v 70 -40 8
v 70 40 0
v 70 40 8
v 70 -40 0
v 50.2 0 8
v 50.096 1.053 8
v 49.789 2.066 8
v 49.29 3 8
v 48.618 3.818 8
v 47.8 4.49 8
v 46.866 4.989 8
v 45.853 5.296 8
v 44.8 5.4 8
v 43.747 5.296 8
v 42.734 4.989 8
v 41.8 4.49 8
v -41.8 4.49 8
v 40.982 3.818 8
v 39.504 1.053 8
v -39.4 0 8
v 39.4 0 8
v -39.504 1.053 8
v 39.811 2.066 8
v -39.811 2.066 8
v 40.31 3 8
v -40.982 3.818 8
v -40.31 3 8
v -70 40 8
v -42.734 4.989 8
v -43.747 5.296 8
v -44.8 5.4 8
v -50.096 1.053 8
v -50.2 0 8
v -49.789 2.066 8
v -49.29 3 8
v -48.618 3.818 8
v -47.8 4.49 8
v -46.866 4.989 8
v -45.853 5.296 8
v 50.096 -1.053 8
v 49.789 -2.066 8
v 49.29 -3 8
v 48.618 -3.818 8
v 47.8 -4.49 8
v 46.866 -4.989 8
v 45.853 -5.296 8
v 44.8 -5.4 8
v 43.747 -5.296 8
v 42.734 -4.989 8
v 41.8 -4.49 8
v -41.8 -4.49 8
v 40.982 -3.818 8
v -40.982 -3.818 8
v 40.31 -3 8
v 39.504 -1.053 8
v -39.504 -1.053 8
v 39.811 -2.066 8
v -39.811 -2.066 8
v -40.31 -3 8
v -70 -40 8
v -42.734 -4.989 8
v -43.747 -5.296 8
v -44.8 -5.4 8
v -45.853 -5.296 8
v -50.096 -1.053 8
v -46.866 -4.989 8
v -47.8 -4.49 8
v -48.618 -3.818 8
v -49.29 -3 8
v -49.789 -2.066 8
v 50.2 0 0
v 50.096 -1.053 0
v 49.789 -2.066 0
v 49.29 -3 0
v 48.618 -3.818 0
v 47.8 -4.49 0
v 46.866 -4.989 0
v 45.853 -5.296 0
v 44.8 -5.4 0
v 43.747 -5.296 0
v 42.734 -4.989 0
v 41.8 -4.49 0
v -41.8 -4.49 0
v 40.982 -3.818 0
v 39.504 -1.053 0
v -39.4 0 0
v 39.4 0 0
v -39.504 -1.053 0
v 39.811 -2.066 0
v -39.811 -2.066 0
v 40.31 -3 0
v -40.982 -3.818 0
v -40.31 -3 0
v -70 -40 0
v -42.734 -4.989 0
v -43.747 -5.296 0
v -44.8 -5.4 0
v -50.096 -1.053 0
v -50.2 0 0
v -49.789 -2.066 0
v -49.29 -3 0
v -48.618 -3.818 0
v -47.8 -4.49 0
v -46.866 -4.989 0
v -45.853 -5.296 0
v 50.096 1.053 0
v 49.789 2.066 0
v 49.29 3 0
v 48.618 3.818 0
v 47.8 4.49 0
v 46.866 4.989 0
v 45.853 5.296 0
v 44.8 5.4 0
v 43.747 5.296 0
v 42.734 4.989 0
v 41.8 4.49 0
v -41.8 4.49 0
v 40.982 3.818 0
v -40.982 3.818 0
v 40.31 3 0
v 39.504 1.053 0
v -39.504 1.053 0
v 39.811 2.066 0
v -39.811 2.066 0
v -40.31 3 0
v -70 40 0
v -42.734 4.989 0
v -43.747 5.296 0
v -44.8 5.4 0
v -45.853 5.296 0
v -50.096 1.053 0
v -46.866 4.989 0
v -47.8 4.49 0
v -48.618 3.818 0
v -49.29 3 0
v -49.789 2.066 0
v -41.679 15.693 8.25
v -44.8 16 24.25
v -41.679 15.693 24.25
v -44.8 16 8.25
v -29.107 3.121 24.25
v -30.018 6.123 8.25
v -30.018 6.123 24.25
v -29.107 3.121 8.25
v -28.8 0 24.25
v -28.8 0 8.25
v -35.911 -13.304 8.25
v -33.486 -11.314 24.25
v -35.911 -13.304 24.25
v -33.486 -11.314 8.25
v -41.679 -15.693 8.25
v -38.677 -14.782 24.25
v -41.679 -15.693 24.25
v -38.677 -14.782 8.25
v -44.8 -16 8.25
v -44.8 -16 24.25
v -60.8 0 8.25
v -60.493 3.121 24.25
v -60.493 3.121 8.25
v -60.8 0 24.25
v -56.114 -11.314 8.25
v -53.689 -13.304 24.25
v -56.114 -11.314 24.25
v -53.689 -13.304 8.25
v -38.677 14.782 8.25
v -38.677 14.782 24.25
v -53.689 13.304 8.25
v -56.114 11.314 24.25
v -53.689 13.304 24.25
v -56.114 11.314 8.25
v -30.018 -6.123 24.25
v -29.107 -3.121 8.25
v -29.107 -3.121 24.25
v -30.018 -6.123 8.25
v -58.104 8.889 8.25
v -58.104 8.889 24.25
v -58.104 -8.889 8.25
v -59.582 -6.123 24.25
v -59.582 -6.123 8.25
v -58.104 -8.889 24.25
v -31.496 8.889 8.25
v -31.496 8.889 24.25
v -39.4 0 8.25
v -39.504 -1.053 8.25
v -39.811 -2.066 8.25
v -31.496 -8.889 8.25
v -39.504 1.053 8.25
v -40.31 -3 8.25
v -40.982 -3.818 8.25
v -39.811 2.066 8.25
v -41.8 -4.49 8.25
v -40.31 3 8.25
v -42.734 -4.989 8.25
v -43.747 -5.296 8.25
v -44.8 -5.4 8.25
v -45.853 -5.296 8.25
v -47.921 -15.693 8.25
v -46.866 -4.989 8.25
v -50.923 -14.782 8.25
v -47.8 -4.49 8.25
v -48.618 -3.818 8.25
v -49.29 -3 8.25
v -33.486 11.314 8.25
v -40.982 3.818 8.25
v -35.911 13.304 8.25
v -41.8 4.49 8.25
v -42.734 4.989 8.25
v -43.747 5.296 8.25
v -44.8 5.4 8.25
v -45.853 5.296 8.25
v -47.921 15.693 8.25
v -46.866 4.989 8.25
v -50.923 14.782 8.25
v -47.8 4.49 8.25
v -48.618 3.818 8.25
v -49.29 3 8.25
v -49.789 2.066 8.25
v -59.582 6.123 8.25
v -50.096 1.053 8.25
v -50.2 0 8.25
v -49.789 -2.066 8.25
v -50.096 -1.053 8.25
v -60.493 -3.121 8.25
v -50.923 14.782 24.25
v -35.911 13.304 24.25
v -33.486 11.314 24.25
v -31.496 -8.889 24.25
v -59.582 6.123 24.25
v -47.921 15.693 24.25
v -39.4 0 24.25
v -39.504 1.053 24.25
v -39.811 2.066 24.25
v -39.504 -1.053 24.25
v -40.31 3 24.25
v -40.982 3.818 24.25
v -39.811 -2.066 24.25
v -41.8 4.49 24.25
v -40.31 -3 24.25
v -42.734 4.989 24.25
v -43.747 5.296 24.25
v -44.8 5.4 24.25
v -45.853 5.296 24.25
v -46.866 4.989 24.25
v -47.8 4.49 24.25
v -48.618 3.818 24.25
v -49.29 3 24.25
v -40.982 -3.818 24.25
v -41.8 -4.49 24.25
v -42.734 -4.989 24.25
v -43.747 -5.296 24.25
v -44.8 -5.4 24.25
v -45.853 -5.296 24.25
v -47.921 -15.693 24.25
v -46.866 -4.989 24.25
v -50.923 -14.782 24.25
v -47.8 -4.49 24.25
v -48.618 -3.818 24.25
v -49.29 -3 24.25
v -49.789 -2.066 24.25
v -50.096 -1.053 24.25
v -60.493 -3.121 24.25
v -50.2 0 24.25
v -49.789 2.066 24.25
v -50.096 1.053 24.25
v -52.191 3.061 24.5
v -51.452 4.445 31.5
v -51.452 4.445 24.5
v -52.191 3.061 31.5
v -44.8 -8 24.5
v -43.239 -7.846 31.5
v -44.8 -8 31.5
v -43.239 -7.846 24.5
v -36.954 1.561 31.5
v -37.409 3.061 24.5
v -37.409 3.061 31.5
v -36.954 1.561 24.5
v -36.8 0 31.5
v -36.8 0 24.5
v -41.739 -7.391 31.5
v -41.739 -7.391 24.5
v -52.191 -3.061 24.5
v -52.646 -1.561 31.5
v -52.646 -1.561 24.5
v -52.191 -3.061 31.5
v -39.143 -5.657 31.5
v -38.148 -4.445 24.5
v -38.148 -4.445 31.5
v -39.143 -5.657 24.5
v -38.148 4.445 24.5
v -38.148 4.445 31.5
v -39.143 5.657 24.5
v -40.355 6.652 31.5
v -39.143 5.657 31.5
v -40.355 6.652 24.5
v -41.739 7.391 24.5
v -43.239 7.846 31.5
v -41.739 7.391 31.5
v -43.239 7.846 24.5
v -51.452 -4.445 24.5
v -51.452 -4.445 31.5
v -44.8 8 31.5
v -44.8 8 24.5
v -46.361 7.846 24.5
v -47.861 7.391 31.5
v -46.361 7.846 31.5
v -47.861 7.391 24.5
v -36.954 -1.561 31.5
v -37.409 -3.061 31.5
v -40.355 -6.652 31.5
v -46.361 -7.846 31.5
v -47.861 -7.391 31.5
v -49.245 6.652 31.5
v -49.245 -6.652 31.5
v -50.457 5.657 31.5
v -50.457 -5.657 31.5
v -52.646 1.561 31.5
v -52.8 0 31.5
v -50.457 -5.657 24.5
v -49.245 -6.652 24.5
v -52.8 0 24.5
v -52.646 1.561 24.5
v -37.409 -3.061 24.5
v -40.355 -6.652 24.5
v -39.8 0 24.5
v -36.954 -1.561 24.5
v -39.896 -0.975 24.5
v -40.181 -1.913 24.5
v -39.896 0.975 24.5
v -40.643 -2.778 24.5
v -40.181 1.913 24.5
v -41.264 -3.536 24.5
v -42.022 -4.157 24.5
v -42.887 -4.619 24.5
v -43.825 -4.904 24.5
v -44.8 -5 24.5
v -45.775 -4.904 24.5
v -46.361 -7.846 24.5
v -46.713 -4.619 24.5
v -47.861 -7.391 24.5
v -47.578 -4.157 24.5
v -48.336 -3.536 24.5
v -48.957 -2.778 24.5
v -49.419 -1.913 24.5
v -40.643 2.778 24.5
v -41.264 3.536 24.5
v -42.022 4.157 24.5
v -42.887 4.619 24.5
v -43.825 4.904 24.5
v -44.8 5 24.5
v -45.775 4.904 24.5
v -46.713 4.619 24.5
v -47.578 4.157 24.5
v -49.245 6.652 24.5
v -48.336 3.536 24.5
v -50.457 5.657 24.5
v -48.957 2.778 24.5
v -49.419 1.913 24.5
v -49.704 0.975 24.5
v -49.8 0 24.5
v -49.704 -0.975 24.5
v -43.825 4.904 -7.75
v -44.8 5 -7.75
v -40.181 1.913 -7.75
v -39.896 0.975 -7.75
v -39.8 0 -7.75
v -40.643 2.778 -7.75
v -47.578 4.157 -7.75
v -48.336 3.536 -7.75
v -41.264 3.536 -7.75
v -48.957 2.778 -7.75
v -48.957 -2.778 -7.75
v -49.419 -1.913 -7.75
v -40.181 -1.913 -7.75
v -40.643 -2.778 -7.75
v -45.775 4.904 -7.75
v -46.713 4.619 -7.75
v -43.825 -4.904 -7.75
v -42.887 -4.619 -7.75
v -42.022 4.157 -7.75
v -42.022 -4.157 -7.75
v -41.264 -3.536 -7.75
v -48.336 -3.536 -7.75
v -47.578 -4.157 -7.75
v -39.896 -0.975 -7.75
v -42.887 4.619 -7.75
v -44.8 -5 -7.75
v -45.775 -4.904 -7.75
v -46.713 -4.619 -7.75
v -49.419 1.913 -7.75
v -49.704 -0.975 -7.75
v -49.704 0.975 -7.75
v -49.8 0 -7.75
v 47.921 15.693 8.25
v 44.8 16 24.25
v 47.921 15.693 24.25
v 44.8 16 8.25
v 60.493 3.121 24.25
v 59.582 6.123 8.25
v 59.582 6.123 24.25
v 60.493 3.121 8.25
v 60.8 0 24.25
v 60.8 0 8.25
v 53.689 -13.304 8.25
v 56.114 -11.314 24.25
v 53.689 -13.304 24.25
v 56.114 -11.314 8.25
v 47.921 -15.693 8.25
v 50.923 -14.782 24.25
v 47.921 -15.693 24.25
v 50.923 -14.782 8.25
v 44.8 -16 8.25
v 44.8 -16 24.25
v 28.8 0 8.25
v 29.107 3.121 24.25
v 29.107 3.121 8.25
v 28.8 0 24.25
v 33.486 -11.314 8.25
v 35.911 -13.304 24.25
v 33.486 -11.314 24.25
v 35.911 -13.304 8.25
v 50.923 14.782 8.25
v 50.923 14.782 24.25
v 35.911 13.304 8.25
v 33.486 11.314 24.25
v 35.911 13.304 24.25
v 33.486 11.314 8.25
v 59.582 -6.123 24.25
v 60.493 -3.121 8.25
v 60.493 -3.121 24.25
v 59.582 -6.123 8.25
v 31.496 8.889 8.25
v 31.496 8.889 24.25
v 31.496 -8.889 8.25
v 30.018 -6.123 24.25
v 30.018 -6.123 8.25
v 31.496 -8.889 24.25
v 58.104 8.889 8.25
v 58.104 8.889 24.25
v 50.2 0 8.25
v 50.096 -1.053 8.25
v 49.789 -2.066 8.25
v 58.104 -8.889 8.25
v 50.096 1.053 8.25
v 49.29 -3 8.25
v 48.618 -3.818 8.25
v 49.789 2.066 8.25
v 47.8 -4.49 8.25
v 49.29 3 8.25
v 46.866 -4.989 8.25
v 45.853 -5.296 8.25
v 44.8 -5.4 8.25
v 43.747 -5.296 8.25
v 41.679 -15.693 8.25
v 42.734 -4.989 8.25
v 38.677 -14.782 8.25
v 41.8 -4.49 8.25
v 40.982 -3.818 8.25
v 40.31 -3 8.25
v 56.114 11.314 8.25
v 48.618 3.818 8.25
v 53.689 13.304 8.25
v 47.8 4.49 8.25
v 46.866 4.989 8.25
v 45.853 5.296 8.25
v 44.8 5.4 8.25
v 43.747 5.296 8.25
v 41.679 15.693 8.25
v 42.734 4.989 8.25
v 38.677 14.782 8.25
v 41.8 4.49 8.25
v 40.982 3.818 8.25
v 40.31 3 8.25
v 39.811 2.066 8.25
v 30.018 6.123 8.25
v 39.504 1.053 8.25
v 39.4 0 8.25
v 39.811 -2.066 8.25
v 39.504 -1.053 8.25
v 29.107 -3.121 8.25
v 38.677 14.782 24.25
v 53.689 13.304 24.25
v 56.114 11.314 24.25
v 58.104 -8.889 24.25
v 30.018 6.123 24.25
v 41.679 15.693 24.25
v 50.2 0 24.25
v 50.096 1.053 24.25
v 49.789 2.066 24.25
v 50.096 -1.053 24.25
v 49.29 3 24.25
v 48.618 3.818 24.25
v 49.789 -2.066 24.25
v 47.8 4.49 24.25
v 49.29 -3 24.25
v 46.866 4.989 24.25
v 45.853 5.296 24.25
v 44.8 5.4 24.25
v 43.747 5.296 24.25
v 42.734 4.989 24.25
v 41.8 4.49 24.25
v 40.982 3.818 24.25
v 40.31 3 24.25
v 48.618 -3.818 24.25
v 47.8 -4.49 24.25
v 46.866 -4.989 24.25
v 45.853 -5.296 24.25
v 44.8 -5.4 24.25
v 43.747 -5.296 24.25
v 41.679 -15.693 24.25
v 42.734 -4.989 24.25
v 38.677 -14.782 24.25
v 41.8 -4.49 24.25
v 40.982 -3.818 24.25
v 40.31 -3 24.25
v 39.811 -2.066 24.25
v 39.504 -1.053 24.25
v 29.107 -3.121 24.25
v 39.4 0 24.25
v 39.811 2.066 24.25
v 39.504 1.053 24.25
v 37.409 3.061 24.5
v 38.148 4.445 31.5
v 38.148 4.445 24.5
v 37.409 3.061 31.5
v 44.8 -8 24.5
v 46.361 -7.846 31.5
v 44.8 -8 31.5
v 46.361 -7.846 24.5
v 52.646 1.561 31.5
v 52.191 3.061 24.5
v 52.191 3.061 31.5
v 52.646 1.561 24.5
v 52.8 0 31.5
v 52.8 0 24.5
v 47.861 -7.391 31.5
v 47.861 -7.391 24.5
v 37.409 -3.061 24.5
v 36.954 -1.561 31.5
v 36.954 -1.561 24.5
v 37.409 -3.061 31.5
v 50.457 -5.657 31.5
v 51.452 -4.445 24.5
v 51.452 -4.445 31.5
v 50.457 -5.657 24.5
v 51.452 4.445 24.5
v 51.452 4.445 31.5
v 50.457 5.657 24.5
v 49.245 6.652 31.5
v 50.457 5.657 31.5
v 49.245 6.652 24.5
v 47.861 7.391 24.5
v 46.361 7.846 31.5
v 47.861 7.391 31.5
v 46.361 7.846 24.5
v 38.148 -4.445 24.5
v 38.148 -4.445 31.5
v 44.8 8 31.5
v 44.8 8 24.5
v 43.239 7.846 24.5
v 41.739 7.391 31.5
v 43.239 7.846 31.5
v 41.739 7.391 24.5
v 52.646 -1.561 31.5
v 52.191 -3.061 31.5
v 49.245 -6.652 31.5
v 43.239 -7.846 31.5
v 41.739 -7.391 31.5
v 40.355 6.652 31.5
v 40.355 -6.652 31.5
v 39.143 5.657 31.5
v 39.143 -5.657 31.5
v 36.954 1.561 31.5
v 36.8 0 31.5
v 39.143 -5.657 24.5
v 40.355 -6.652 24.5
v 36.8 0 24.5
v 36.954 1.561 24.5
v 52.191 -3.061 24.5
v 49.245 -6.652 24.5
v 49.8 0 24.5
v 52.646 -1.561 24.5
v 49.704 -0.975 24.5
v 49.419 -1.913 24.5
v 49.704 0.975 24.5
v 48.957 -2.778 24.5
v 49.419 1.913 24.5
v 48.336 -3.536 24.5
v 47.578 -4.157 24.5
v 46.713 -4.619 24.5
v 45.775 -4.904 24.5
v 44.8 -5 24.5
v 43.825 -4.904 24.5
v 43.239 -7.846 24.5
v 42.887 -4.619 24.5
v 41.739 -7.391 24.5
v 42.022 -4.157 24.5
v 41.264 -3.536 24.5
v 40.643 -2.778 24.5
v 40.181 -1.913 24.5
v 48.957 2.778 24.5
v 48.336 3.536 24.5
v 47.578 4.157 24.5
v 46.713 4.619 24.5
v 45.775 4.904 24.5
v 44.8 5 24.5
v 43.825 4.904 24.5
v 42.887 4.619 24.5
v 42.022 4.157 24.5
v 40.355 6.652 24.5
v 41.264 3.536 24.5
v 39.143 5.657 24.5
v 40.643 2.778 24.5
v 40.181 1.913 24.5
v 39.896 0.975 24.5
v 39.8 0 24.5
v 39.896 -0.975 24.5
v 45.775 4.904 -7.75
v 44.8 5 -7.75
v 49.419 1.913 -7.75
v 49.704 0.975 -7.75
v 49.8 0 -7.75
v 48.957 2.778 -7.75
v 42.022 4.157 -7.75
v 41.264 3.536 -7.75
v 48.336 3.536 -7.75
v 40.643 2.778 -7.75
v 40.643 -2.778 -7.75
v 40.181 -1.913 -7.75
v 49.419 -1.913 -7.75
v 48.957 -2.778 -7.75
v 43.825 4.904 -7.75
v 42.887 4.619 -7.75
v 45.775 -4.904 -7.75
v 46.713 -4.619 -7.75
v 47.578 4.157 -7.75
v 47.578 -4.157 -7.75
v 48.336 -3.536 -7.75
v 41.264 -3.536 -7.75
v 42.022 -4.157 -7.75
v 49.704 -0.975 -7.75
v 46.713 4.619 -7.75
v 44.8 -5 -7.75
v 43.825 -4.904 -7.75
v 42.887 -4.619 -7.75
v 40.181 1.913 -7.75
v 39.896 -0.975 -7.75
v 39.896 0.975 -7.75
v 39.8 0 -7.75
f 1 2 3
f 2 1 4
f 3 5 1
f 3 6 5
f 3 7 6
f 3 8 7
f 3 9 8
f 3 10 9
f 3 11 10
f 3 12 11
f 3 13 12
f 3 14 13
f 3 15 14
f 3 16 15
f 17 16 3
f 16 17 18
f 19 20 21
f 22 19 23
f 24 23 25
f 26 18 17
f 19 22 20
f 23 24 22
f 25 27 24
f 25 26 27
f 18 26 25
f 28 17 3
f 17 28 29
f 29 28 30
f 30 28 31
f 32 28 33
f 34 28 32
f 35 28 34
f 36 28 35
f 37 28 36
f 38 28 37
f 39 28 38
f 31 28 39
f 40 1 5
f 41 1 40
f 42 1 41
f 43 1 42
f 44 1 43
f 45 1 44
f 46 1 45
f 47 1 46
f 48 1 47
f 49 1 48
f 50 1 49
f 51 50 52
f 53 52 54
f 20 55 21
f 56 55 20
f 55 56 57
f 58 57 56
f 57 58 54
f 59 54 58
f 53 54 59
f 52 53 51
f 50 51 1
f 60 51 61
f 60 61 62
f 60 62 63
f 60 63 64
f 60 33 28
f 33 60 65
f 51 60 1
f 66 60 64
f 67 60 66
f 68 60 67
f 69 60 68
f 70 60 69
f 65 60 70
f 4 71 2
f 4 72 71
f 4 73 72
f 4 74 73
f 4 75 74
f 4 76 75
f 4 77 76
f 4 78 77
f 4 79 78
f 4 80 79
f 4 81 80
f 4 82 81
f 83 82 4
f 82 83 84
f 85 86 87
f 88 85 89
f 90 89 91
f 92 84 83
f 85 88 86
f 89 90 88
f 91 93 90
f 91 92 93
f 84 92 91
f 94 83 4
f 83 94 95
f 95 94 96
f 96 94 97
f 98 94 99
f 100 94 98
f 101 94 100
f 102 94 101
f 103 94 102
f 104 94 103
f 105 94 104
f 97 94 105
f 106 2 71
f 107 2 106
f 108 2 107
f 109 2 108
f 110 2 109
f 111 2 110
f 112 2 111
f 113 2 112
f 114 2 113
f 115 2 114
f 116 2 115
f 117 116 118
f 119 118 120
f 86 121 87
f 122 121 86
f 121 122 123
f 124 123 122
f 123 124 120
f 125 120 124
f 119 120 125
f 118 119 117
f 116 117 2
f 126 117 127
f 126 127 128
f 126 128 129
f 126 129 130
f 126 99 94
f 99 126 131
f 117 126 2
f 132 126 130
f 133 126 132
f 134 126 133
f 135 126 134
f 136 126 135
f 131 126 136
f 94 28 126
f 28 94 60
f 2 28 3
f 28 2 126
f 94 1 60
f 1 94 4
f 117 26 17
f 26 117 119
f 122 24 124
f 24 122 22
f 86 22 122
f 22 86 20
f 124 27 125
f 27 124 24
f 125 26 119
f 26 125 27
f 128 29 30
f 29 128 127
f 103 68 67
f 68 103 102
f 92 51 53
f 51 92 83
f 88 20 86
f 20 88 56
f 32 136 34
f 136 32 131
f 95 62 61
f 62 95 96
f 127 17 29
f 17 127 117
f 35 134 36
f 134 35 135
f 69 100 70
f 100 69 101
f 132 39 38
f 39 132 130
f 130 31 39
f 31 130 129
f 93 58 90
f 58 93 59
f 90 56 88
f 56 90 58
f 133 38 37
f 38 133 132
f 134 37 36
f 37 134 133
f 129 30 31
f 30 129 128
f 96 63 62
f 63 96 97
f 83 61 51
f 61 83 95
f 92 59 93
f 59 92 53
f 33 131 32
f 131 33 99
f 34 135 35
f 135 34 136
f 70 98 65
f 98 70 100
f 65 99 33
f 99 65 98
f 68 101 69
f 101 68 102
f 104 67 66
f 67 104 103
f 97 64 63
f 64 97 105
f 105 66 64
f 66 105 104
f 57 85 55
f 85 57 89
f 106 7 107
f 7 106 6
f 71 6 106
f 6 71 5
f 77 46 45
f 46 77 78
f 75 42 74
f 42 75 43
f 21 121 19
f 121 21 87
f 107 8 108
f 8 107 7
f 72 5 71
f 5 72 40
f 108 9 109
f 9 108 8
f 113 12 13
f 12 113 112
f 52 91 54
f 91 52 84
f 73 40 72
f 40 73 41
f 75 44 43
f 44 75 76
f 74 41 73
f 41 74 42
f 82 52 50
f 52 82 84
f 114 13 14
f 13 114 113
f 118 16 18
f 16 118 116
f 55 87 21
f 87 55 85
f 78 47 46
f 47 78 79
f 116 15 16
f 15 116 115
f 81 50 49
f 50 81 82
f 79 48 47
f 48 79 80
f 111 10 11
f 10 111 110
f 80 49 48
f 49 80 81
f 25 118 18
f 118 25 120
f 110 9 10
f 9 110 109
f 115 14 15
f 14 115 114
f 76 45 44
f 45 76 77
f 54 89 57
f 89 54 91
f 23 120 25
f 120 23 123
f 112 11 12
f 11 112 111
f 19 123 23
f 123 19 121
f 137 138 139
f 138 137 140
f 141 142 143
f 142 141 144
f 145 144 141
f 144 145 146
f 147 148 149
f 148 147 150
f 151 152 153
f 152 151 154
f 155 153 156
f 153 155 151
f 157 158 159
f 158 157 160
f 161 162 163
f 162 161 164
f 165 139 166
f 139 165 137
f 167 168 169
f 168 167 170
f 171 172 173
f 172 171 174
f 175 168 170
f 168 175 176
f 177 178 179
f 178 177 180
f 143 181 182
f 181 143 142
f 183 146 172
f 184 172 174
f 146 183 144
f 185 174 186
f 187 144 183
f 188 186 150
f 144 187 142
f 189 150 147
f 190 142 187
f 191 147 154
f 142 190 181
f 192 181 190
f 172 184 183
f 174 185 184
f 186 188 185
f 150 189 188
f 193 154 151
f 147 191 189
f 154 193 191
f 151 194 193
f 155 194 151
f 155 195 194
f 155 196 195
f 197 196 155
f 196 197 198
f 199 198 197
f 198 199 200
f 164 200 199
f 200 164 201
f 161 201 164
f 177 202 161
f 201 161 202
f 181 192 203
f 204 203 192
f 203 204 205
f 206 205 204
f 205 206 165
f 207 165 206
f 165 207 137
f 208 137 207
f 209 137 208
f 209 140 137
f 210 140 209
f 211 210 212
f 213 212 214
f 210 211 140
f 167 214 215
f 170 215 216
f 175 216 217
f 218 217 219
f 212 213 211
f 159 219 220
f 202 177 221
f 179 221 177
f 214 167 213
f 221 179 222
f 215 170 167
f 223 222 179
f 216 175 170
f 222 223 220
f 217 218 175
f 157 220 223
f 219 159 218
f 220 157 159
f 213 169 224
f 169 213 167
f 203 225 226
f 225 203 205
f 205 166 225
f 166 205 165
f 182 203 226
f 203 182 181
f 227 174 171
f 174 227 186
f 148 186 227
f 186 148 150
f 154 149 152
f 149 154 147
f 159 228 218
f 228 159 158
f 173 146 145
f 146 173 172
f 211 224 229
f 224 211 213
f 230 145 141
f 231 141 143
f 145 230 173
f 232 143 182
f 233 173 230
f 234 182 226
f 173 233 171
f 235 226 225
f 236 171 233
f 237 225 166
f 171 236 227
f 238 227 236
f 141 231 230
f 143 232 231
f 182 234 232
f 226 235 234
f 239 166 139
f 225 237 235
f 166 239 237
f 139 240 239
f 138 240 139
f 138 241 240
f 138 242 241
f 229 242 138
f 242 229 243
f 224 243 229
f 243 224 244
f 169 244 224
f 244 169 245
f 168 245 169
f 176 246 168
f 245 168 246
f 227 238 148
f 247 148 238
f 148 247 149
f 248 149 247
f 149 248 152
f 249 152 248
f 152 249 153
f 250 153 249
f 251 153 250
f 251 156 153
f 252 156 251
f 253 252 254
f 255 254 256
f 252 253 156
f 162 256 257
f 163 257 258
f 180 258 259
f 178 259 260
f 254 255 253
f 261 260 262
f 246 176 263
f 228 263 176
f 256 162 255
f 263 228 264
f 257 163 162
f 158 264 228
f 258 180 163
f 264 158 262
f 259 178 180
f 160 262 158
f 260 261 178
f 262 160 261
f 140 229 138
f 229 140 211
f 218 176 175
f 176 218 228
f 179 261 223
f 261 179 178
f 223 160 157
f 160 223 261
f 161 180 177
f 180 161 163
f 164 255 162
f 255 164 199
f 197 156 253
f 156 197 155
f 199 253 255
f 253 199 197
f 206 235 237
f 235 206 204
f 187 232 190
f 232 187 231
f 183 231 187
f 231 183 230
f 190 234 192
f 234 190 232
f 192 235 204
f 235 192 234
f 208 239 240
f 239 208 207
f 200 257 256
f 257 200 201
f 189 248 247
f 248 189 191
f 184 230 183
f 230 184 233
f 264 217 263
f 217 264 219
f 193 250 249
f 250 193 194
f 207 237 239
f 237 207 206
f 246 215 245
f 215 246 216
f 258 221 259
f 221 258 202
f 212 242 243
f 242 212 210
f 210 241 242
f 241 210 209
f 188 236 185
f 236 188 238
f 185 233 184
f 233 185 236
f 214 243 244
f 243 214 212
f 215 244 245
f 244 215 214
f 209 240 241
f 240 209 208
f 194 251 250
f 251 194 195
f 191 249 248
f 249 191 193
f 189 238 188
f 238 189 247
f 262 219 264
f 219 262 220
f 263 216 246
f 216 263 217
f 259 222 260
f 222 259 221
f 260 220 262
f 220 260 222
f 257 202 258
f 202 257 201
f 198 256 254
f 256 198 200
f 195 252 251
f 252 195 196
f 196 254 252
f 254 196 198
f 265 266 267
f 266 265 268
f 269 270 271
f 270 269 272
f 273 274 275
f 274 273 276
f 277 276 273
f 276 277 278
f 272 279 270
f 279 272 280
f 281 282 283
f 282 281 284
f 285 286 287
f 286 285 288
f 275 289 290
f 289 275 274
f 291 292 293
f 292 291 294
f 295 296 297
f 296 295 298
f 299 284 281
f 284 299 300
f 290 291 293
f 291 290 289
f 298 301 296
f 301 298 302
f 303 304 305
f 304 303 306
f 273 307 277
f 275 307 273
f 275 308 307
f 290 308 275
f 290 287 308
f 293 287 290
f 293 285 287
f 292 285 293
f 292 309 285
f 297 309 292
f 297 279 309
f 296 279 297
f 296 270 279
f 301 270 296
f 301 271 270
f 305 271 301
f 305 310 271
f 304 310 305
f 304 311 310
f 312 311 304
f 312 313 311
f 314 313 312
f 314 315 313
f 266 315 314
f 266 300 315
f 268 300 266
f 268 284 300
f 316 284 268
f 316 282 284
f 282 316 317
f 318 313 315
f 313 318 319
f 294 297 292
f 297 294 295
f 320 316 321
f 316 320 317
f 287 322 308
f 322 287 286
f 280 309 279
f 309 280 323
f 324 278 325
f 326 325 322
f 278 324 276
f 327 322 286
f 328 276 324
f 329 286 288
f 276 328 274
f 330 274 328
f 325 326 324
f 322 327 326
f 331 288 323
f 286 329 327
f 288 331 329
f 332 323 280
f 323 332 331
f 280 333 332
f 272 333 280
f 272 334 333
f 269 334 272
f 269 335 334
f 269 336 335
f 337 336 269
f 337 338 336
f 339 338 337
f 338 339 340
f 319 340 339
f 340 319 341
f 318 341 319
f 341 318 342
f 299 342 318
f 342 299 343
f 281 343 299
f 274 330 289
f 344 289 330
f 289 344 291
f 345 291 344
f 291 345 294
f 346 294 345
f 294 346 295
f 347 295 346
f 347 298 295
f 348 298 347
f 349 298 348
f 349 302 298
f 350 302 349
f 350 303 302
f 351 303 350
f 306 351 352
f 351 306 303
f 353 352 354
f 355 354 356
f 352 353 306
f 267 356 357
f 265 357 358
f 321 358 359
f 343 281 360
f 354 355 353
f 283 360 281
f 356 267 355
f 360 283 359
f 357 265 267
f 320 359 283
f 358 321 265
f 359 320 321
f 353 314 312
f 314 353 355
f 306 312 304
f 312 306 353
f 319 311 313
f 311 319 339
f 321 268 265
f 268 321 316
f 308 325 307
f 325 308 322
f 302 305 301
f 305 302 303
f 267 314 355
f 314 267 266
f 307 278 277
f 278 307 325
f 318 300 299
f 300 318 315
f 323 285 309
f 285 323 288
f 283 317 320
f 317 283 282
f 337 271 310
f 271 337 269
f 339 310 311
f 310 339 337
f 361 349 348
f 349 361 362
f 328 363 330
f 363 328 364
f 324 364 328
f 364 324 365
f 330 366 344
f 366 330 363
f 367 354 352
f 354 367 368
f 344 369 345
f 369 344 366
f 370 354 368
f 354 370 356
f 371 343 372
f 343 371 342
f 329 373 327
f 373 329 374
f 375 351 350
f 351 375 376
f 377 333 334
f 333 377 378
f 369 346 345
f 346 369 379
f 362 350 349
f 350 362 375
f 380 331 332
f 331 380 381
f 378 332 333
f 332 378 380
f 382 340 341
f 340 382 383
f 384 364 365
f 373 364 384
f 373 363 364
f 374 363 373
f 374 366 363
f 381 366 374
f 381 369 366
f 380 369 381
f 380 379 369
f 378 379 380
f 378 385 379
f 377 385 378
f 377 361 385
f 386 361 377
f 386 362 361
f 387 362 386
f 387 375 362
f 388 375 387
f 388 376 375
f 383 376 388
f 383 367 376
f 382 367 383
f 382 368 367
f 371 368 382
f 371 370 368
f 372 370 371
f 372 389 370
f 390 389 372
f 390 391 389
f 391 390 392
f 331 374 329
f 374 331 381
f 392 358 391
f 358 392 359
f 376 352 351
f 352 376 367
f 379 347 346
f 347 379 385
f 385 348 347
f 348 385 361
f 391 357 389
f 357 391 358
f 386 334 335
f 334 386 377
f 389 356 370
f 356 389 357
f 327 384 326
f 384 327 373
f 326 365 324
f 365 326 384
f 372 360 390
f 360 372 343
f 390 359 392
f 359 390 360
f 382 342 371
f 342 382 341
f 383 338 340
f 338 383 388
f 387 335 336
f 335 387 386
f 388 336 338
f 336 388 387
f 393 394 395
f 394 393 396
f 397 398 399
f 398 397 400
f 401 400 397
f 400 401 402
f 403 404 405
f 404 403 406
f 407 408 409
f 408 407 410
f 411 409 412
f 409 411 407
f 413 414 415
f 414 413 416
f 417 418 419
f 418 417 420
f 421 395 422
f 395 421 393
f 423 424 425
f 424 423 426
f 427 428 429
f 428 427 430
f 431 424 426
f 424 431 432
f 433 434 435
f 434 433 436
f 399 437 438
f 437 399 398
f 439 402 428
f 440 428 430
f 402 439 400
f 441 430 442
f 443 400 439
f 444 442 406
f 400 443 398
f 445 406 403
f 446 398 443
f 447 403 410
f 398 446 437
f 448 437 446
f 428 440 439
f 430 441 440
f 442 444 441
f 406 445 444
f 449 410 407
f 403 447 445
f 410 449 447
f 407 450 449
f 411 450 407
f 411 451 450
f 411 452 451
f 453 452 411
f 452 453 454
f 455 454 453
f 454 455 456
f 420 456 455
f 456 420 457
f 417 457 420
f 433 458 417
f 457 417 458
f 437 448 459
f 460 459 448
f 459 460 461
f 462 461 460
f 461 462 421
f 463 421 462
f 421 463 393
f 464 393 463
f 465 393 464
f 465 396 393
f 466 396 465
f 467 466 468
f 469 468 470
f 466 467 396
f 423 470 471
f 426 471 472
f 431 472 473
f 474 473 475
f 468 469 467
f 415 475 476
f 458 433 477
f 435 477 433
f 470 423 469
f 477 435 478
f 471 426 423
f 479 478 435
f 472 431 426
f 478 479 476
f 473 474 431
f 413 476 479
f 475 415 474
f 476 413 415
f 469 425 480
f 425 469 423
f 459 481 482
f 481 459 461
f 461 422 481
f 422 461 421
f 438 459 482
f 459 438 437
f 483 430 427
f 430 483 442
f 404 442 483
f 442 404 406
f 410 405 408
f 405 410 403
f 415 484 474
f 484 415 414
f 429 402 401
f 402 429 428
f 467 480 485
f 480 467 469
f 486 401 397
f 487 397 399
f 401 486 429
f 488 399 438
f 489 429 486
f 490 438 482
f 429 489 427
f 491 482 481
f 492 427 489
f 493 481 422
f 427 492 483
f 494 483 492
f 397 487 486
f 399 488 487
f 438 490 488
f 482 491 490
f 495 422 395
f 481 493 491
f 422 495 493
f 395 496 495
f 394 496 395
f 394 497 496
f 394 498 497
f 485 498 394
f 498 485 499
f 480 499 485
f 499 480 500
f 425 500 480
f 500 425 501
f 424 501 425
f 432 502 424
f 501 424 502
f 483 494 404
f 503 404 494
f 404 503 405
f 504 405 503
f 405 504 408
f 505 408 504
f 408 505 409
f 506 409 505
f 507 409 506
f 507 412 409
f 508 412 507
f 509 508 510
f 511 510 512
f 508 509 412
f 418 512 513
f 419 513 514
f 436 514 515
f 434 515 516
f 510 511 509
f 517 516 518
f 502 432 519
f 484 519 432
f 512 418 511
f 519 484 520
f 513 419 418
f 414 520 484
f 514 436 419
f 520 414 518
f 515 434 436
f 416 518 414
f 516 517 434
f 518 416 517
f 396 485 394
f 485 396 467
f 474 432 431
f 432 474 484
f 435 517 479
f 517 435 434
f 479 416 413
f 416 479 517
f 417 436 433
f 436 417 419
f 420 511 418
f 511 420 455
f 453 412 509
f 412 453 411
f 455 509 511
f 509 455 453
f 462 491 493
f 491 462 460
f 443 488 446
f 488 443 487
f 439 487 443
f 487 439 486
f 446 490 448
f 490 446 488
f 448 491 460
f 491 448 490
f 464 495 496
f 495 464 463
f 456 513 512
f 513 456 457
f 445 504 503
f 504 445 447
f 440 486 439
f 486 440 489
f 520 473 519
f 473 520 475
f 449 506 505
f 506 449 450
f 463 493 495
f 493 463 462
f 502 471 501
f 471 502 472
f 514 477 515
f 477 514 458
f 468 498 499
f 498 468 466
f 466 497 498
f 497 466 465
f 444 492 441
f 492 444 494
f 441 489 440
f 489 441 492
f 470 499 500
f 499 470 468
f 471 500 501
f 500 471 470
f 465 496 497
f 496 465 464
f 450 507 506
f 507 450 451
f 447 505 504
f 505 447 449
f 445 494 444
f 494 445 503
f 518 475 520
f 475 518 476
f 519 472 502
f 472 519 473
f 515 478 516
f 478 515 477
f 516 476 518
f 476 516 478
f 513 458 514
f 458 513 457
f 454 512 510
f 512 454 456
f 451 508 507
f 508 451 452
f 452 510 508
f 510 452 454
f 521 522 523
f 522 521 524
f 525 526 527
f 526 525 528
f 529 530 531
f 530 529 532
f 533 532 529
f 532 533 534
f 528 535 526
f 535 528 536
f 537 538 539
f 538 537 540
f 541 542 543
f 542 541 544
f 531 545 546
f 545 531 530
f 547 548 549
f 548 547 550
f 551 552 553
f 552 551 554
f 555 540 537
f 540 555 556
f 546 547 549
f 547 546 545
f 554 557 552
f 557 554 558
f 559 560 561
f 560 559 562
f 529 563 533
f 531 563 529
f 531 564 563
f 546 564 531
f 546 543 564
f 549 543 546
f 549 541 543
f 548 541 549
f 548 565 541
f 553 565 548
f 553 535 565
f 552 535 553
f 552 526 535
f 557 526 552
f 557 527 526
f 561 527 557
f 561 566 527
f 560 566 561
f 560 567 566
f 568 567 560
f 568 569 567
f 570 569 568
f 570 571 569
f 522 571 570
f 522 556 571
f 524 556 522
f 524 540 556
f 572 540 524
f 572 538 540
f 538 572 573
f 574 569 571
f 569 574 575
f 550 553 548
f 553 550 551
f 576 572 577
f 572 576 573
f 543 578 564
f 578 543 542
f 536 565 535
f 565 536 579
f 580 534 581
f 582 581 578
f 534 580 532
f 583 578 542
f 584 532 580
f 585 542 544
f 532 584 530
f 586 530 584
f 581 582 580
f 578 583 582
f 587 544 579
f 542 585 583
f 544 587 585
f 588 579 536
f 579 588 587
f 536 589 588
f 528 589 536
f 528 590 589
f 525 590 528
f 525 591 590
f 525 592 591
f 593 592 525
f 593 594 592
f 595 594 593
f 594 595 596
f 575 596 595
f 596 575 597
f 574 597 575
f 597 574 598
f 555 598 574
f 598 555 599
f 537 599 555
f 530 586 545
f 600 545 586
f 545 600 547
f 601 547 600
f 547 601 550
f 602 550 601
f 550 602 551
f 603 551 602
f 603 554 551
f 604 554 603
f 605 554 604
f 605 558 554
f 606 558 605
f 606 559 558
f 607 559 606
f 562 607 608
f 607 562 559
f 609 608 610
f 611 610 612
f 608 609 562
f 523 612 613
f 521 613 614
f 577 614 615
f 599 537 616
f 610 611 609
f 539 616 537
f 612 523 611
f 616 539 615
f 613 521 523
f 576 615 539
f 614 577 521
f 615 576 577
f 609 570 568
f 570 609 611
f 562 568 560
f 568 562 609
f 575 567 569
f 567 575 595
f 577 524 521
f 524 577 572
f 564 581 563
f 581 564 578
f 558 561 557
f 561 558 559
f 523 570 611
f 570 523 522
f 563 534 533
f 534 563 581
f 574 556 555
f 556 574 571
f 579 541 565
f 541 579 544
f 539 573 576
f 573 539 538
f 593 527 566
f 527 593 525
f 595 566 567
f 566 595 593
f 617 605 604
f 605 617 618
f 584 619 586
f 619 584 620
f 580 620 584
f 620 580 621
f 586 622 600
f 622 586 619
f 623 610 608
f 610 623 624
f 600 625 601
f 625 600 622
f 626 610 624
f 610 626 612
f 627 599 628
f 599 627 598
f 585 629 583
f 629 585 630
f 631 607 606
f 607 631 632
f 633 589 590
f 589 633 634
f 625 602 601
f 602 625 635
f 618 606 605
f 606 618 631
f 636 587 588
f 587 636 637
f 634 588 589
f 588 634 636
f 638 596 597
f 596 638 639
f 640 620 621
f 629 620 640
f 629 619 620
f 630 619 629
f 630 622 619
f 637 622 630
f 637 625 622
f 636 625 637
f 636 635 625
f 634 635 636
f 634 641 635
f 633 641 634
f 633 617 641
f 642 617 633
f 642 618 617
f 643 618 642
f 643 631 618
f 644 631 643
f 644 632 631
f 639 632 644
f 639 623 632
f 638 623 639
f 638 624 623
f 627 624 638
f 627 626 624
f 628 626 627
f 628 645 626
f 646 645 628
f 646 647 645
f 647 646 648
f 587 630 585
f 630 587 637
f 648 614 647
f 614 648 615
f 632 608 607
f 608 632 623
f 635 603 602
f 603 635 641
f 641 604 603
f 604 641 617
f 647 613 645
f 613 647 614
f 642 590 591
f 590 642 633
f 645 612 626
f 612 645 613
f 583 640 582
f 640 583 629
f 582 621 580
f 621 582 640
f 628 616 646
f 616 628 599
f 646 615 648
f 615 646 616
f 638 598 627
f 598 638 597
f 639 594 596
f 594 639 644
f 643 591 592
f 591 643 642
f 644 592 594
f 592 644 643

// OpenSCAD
$fn = 32;

// ------------------------------------------------------------------------
// Standoff columns: 2 d32 standoffs, bolts d10
// Every part is its own module, assembly() places them once.
// ------------------------------------------------------------------------

// --- part 1 ---
module base_plate() {
  difference() {
    translate([-70, -40, 0]) cube([140, 80, 8]);
    translate([-44.8, 0, -1]) cylinder(h = 10, d = 10.8);
    translate([44.8, 0, -1]) cylinder(h = 10, d = 10.8);
  }
}

// --- part 2 ---
module spacer1() {
  difference() {
      translate([0, 0, 0]) cylinder(h = 16, d = 32);
      translate([0, 0, -1]) cylinder(h = 18, d = 10.8);
    }
}

// --- part 3 ---
module bolt1() {
  cylinder(h = 7, d = 16);
  translate([0, 0, -32.25]) cylinder(h = 32.25, d = 10);
}

// --- part 4 ---
module spacer2() {
  difference() {
      translate([0, 0, 0]) cylinder(h = 16, d = 32);
      translate([0, 0, -1]) cylinder(h = 18, d = 10.8);
    }
}

// --- part 5 ---
module bolt2() {
  cylinder(h = 7, d = 16);
  translate([0, 0, -32.25]) cylinder(h = 32.25, d = 10);
}

// --- assembly ---
module assembly() {
  translate([0, 0, 0]) rotate([0, 0, 0]) base_plate();
  translate([-44.8, 0, 8.25]) rotate([0, 0, 0]) spacer1();
  translate([-44.8, 0, 24.5]) rotate([0, 0, 0]) bolt1();
  translate([44.8, 0, 8.25]) rotate([0, 0, 0]) spacer2();
  translate([44.8, 0, 24.5]) rotate([0, 0, 0]) bolt2();
}

assembly();
